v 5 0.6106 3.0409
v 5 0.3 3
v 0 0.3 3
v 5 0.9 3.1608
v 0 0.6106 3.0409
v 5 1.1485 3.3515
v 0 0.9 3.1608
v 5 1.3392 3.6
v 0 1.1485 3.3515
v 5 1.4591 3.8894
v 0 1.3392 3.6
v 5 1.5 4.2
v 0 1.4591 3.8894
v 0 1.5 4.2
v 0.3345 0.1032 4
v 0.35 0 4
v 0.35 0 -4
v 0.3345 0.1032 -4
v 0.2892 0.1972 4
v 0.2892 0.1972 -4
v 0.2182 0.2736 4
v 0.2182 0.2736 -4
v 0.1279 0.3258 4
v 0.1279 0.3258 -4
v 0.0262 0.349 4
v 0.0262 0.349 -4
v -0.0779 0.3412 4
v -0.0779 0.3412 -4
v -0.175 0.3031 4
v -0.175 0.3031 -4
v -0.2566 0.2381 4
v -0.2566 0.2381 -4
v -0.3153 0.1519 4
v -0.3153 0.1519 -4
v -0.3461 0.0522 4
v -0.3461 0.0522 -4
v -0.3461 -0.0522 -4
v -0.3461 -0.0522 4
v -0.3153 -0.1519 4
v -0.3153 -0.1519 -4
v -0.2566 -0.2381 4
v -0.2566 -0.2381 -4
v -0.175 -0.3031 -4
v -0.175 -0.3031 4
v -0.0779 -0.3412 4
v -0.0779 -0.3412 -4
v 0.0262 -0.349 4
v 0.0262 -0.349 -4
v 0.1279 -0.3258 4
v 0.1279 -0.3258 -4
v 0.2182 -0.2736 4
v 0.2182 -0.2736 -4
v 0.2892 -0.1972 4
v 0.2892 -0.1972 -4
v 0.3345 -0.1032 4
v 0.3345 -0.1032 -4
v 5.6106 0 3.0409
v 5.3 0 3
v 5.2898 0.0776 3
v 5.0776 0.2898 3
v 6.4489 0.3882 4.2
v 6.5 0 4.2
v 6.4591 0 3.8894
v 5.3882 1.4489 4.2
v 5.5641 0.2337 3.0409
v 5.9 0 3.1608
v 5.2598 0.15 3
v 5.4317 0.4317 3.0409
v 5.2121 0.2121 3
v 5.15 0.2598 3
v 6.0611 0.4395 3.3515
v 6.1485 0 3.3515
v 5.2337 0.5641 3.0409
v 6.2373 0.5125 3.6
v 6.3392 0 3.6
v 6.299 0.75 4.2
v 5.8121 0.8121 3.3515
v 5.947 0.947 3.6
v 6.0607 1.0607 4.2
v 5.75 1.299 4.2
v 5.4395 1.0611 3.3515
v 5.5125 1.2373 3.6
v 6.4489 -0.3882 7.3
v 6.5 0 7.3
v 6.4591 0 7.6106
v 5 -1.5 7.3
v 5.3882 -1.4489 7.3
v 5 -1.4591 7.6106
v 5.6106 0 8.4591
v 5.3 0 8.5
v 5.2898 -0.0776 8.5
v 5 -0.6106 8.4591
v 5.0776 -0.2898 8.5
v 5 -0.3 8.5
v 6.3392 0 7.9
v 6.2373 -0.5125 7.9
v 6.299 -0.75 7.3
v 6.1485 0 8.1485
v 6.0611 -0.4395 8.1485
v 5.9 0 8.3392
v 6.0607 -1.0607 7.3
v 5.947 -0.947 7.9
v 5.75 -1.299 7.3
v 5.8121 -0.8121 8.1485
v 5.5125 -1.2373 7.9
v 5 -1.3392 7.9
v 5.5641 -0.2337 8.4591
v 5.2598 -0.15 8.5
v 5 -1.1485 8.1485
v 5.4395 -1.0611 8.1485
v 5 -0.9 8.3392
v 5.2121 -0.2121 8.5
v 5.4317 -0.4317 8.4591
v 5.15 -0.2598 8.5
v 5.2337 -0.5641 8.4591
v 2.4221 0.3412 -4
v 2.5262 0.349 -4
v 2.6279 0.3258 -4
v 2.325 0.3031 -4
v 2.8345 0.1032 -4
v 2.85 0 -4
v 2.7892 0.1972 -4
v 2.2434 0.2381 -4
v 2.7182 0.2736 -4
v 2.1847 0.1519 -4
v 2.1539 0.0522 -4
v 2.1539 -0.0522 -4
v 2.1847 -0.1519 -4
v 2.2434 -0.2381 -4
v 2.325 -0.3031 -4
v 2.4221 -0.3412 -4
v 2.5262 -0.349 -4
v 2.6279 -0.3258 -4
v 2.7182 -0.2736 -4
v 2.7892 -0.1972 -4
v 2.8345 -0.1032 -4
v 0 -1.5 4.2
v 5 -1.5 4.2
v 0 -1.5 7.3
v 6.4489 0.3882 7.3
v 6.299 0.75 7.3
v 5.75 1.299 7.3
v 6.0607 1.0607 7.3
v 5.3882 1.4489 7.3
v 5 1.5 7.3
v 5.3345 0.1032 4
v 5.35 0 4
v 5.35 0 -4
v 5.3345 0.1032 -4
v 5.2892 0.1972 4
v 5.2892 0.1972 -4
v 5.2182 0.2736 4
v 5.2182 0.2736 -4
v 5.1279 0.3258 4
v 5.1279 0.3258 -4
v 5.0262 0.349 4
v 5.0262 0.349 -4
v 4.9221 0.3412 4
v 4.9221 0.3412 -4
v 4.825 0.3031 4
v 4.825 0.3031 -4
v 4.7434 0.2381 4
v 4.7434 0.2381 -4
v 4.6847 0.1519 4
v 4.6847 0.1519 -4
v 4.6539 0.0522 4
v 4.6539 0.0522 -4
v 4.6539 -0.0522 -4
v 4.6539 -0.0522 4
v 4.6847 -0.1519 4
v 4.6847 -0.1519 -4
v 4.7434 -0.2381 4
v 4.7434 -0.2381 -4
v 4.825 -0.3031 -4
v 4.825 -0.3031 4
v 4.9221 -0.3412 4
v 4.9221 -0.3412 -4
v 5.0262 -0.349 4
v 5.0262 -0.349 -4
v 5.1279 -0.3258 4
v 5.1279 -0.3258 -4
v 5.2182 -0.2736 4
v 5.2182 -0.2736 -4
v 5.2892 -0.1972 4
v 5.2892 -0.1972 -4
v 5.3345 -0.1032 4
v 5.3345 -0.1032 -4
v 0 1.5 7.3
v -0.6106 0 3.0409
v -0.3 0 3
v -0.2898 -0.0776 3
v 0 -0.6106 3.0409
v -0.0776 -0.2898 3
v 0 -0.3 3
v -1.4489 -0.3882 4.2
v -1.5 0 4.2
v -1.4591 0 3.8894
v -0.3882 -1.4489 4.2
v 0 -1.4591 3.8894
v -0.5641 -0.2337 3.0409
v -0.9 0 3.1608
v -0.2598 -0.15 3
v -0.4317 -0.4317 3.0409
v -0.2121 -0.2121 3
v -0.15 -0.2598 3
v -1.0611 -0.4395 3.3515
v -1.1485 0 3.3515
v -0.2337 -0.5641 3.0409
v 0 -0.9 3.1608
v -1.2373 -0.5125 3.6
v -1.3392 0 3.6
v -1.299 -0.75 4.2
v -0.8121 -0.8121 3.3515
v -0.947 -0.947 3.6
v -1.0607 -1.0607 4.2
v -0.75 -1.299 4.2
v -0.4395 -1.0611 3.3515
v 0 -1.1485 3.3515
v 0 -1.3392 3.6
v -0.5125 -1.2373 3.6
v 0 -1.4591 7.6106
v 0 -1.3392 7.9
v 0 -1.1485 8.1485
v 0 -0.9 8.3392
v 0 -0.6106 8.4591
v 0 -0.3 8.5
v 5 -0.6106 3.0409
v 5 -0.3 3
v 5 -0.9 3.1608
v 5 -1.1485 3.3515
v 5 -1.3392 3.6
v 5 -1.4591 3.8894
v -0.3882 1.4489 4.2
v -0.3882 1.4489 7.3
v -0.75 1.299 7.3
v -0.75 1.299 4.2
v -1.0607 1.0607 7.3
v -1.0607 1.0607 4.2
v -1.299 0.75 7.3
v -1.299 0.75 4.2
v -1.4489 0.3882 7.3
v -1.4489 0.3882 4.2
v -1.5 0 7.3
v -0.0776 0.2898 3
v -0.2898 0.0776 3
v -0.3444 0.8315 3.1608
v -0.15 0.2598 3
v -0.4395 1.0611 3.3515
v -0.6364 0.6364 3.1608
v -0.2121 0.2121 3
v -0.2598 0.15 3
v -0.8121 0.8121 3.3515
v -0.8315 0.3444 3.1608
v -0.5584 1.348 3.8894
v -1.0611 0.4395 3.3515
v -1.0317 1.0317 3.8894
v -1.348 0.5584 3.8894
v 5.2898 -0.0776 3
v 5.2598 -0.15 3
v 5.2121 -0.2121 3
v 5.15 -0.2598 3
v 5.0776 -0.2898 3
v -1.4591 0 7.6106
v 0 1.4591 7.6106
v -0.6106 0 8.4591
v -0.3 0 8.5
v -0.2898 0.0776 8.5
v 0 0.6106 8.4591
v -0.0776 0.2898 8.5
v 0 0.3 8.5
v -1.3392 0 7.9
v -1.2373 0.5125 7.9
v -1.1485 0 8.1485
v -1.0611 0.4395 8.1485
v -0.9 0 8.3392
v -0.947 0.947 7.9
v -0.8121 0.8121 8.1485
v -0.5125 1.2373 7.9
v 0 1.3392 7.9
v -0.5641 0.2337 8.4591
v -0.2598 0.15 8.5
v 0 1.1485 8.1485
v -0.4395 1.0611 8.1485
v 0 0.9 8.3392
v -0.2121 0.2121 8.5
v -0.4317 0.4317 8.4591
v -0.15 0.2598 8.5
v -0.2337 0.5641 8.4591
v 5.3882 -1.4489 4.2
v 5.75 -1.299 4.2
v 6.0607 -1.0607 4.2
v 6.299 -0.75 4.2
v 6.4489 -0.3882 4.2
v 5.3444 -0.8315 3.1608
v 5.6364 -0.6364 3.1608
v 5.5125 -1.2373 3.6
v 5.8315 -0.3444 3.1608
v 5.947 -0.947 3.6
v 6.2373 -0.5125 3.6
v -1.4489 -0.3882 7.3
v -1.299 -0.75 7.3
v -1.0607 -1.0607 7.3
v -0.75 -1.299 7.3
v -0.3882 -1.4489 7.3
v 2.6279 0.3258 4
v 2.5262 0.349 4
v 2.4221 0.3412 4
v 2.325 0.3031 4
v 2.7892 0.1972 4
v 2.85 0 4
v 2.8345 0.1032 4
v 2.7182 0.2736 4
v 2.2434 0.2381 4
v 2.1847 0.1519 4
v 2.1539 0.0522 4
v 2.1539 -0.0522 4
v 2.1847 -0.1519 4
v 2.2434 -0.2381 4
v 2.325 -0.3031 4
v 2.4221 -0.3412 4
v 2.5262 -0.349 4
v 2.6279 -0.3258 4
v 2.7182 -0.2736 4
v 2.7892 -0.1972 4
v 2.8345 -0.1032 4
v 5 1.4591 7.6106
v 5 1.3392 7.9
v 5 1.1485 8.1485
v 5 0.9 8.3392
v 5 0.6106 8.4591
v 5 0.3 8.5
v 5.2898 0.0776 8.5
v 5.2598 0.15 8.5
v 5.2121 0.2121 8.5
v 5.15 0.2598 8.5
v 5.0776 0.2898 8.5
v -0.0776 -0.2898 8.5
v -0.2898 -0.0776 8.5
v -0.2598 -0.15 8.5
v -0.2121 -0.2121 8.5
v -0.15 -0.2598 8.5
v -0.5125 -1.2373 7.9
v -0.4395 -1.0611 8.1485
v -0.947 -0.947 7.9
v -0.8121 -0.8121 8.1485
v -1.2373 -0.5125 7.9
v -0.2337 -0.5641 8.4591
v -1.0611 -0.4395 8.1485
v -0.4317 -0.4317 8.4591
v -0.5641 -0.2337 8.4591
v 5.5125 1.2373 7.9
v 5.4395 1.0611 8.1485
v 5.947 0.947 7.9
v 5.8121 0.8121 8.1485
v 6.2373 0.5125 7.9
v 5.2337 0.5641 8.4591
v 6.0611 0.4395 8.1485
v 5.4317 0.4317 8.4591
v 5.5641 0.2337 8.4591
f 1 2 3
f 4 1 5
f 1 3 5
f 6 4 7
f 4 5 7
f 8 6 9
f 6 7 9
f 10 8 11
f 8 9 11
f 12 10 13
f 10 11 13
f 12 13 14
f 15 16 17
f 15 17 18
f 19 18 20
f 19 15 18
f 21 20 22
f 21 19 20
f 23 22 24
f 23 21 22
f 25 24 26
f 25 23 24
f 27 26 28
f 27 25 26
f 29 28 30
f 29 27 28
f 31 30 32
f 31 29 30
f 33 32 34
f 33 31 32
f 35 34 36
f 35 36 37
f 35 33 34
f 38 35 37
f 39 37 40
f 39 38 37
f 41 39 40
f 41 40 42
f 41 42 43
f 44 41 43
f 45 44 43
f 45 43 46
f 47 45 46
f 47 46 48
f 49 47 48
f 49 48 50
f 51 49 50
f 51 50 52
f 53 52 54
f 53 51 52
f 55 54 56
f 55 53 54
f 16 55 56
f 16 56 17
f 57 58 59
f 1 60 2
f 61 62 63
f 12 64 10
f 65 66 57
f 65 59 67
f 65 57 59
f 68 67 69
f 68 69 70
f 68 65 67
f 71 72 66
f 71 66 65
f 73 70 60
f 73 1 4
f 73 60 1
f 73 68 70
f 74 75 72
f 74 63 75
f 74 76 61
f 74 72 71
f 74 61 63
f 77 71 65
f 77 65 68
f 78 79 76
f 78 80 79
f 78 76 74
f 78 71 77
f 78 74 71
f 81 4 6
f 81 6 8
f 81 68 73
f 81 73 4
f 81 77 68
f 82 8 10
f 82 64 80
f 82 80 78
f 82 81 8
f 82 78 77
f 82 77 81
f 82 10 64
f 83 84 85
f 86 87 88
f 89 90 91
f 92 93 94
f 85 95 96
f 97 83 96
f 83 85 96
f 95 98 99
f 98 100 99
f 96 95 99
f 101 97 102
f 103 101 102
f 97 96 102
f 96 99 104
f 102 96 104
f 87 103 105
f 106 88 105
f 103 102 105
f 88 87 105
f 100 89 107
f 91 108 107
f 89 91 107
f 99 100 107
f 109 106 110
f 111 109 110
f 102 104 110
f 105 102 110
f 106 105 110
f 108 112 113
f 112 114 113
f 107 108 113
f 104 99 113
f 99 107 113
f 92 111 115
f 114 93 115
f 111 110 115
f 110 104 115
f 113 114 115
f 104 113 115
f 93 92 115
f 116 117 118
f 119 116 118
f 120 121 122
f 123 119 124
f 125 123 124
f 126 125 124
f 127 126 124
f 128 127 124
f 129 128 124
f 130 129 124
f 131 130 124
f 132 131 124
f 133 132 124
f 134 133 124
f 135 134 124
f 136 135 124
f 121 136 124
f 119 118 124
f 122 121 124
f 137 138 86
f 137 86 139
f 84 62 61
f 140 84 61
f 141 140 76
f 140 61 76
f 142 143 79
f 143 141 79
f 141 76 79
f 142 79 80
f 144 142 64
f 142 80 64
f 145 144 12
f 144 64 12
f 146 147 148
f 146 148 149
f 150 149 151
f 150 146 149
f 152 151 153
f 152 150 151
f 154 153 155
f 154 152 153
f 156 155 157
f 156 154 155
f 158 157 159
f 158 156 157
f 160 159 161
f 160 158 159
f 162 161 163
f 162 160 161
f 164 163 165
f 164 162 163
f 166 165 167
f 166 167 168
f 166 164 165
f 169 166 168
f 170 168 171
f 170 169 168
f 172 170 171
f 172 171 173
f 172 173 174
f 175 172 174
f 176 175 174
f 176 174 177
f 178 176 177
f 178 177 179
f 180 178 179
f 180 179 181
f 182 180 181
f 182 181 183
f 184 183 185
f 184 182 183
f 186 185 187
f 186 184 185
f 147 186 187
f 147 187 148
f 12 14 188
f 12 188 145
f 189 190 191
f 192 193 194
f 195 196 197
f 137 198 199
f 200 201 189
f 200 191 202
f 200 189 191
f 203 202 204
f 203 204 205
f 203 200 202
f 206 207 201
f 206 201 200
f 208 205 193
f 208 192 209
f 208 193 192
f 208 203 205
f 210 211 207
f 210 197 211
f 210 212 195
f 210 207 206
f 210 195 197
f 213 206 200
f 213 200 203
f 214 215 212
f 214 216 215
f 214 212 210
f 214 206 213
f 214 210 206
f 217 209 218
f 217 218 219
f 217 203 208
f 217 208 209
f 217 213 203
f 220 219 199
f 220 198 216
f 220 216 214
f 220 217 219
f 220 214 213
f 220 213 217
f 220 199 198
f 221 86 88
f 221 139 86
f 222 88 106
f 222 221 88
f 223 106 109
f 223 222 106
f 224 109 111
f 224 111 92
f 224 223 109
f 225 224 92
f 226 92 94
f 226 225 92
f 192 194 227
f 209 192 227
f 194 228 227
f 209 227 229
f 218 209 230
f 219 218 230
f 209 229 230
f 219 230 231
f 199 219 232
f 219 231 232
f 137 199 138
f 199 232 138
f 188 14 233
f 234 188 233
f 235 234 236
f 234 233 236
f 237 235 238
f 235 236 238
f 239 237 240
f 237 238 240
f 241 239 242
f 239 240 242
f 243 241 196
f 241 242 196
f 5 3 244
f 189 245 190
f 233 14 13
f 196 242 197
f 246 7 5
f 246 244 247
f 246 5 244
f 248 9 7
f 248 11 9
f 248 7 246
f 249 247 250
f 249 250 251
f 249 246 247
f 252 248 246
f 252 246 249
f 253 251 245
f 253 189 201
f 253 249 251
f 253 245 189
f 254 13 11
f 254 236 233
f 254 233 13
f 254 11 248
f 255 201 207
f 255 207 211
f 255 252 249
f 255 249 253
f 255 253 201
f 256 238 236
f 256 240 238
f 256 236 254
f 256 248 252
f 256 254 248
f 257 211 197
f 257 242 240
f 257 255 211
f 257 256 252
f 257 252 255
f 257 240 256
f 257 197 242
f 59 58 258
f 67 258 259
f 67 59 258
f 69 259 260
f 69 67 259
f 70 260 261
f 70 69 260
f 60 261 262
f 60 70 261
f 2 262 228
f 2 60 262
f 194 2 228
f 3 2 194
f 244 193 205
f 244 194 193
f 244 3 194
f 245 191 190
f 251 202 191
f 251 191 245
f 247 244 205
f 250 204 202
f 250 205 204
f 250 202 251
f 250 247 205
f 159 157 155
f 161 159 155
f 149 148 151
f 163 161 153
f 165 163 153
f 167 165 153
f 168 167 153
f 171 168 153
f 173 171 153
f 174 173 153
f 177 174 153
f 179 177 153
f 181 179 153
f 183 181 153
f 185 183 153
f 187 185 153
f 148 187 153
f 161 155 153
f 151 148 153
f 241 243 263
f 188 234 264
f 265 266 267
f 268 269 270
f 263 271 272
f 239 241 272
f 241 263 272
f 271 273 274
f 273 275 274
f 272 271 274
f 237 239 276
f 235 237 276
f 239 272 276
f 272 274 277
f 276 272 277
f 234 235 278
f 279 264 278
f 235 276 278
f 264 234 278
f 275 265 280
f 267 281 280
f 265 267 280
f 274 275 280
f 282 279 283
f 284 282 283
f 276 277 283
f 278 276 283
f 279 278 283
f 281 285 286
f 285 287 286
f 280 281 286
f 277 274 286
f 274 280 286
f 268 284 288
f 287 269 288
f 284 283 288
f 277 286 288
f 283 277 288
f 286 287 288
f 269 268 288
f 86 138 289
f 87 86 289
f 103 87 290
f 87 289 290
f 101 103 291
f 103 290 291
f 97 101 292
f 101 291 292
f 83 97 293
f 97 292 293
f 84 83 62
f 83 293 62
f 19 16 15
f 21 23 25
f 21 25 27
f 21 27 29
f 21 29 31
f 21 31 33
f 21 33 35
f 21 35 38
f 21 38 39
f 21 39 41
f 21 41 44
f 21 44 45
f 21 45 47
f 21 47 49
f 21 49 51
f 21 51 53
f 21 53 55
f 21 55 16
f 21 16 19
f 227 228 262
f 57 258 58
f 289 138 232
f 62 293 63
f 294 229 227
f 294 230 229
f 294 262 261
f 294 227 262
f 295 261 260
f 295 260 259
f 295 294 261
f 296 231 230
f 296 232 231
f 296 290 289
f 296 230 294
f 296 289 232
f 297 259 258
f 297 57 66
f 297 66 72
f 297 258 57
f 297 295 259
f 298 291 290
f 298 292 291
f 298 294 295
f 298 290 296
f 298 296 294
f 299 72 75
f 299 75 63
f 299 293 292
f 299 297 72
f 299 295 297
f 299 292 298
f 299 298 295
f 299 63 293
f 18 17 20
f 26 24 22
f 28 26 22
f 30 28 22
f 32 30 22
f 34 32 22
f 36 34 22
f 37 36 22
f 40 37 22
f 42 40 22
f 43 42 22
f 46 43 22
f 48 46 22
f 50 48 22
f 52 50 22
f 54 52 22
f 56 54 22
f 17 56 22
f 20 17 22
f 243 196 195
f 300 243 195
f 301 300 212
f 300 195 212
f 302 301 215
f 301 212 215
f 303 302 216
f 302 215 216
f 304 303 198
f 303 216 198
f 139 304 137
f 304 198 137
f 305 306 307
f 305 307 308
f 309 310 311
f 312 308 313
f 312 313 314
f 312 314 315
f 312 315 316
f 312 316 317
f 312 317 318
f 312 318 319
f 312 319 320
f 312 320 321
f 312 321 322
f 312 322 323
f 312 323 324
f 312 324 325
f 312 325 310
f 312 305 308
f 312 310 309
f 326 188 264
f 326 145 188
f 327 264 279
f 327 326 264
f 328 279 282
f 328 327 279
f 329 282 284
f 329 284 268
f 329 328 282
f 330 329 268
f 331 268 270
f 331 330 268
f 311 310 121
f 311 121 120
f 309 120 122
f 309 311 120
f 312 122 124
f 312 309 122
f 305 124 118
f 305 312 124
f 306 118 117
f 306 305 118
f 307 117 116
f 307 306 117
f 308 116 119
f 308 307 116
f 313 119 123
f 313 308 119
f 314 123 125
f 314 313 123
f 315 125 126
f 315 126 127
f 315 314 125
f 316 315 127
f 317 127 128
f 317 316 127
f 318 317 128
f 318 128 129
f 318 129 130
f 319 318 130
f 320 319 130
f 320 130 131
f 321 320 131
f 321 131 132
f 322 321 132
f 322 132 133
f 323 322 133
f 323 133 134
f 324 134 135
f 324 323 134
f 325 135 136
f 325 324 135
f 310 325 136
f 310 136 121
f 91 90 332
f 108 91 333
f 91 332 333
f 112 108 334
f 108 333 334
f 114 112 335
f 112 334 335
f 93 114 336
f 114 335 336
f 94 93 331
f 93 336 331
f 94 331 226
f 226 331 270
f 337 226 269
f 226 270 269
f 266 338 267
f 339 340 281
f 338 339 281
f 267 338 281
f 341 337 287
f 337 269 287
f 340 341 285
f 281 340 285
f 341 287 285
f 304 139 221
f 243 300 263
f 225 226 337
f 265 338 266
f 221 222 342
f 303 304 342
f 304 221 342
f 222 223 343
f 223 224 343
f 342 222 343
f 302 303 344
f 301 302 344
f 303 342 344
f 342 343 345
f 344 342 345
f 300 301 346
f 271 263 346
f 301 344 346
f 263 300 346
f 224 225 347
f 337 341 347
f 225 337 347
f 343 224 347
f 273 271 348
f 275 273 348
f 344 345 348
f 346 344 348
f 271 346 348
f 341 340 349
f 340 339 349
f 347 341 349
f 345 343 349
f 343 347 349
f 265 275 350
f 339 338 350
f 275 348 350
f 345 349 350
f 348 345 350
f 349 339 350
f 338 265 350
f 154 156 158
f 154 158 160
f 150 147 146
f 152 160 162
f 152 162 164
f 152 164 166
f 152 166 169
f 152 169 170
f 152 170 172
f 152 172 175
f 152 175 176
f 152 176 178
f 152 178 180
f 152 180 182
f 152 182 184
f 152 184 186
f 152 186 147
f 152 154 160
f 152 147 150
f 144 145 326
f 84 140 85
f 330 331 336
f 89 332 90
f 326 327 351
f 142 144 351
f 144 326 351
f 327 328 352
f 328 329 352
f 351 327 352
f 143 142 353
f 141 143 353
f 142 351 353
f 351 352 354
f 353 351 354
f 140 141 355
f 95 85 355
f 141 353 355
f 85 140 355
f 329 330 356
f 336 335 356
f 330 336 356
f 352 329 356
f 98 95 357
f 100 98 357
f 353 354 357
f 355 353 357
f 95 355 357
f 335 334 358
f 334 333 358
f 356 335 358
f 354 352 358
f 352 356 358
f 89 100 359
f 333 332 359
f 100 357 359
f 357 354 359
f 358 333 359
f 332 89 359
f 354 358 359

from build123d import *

# Parameters (mm, degrees)
SKETCH_R     = 0.35
PAD_DEPTH    = 8
PAD002_DEPTH = 5.5
FILLET_R     = 1.2
FILLET001_R  = 1.2


with BuildPart() as pad:
    # Sketch → Pad (new body)
    with BuildSketch(Plane.XY.offset(4)):
        Circle(SKETCH_R)
        with Locations((5, 0)):
            Circle(SKETCH_R)
        with Locations((2.5, 0)):
            Circle(SKETCH_R)
    extrude(amount=-PAD_DEPTH)


with BuildPart() as fillet001:
    # Sketch003 → Pad002 (new body)
    with BuildSketch(Plane.XY.offset(3)):
        with BuildLine():
            Line((0, 1.5), (5, 1.5))
            ThreePointArc((6.5, 0), (6.06066, 1.06066), (5, 1.5))
            ThreePointArc((5, -1.5), (6.06066, -1.06066), (6.5, 0))
            Line((5, -1.5), (0, -1.5))
            ThreePointArc((-1.5, 0), (-1.06066, -1.06066), (0, -1.5))
            ThreePointArc((0, 1.5), (-1.06066, 1.06066), (-1.5, 0))
        make_face()
    extrude(amount=PAD002_DEPTH)

    # Fillet
    fillet_edges = [fillet001.edges().sort_by_distance(p)[0] for p in [
        (2.5, 1.5, 8.5),
        (-1.06066, 1.06066, 8.5),
        (-1.06066, -1.06066, 8.5),
        (2.5, -1.5, 8.5),
        (6.06066, -1.06066, 8.5),
        (6.06066, 1.06066, 8.5),
    ]]
    fillet(fillet_edges, radius=FILLET_R)

    # Fillet001
    fillet001_edges = [fillet001.edges().sort_by_distance(p)[0] for p in [
        (6.06066, -1.06066, 3),
        (6.06066, 1.06066, 3),
        (2.5, 1.5, 3),
        (2.5, -1.5, 3),
        (-1.06066, -1.06066, 3),
        (-1.06066, 1.06066, 3),
    ]]
    fillet(fillet001_edges, radius=FILLET001_R)


solid = Compound([pad.part, fillet001.part])
